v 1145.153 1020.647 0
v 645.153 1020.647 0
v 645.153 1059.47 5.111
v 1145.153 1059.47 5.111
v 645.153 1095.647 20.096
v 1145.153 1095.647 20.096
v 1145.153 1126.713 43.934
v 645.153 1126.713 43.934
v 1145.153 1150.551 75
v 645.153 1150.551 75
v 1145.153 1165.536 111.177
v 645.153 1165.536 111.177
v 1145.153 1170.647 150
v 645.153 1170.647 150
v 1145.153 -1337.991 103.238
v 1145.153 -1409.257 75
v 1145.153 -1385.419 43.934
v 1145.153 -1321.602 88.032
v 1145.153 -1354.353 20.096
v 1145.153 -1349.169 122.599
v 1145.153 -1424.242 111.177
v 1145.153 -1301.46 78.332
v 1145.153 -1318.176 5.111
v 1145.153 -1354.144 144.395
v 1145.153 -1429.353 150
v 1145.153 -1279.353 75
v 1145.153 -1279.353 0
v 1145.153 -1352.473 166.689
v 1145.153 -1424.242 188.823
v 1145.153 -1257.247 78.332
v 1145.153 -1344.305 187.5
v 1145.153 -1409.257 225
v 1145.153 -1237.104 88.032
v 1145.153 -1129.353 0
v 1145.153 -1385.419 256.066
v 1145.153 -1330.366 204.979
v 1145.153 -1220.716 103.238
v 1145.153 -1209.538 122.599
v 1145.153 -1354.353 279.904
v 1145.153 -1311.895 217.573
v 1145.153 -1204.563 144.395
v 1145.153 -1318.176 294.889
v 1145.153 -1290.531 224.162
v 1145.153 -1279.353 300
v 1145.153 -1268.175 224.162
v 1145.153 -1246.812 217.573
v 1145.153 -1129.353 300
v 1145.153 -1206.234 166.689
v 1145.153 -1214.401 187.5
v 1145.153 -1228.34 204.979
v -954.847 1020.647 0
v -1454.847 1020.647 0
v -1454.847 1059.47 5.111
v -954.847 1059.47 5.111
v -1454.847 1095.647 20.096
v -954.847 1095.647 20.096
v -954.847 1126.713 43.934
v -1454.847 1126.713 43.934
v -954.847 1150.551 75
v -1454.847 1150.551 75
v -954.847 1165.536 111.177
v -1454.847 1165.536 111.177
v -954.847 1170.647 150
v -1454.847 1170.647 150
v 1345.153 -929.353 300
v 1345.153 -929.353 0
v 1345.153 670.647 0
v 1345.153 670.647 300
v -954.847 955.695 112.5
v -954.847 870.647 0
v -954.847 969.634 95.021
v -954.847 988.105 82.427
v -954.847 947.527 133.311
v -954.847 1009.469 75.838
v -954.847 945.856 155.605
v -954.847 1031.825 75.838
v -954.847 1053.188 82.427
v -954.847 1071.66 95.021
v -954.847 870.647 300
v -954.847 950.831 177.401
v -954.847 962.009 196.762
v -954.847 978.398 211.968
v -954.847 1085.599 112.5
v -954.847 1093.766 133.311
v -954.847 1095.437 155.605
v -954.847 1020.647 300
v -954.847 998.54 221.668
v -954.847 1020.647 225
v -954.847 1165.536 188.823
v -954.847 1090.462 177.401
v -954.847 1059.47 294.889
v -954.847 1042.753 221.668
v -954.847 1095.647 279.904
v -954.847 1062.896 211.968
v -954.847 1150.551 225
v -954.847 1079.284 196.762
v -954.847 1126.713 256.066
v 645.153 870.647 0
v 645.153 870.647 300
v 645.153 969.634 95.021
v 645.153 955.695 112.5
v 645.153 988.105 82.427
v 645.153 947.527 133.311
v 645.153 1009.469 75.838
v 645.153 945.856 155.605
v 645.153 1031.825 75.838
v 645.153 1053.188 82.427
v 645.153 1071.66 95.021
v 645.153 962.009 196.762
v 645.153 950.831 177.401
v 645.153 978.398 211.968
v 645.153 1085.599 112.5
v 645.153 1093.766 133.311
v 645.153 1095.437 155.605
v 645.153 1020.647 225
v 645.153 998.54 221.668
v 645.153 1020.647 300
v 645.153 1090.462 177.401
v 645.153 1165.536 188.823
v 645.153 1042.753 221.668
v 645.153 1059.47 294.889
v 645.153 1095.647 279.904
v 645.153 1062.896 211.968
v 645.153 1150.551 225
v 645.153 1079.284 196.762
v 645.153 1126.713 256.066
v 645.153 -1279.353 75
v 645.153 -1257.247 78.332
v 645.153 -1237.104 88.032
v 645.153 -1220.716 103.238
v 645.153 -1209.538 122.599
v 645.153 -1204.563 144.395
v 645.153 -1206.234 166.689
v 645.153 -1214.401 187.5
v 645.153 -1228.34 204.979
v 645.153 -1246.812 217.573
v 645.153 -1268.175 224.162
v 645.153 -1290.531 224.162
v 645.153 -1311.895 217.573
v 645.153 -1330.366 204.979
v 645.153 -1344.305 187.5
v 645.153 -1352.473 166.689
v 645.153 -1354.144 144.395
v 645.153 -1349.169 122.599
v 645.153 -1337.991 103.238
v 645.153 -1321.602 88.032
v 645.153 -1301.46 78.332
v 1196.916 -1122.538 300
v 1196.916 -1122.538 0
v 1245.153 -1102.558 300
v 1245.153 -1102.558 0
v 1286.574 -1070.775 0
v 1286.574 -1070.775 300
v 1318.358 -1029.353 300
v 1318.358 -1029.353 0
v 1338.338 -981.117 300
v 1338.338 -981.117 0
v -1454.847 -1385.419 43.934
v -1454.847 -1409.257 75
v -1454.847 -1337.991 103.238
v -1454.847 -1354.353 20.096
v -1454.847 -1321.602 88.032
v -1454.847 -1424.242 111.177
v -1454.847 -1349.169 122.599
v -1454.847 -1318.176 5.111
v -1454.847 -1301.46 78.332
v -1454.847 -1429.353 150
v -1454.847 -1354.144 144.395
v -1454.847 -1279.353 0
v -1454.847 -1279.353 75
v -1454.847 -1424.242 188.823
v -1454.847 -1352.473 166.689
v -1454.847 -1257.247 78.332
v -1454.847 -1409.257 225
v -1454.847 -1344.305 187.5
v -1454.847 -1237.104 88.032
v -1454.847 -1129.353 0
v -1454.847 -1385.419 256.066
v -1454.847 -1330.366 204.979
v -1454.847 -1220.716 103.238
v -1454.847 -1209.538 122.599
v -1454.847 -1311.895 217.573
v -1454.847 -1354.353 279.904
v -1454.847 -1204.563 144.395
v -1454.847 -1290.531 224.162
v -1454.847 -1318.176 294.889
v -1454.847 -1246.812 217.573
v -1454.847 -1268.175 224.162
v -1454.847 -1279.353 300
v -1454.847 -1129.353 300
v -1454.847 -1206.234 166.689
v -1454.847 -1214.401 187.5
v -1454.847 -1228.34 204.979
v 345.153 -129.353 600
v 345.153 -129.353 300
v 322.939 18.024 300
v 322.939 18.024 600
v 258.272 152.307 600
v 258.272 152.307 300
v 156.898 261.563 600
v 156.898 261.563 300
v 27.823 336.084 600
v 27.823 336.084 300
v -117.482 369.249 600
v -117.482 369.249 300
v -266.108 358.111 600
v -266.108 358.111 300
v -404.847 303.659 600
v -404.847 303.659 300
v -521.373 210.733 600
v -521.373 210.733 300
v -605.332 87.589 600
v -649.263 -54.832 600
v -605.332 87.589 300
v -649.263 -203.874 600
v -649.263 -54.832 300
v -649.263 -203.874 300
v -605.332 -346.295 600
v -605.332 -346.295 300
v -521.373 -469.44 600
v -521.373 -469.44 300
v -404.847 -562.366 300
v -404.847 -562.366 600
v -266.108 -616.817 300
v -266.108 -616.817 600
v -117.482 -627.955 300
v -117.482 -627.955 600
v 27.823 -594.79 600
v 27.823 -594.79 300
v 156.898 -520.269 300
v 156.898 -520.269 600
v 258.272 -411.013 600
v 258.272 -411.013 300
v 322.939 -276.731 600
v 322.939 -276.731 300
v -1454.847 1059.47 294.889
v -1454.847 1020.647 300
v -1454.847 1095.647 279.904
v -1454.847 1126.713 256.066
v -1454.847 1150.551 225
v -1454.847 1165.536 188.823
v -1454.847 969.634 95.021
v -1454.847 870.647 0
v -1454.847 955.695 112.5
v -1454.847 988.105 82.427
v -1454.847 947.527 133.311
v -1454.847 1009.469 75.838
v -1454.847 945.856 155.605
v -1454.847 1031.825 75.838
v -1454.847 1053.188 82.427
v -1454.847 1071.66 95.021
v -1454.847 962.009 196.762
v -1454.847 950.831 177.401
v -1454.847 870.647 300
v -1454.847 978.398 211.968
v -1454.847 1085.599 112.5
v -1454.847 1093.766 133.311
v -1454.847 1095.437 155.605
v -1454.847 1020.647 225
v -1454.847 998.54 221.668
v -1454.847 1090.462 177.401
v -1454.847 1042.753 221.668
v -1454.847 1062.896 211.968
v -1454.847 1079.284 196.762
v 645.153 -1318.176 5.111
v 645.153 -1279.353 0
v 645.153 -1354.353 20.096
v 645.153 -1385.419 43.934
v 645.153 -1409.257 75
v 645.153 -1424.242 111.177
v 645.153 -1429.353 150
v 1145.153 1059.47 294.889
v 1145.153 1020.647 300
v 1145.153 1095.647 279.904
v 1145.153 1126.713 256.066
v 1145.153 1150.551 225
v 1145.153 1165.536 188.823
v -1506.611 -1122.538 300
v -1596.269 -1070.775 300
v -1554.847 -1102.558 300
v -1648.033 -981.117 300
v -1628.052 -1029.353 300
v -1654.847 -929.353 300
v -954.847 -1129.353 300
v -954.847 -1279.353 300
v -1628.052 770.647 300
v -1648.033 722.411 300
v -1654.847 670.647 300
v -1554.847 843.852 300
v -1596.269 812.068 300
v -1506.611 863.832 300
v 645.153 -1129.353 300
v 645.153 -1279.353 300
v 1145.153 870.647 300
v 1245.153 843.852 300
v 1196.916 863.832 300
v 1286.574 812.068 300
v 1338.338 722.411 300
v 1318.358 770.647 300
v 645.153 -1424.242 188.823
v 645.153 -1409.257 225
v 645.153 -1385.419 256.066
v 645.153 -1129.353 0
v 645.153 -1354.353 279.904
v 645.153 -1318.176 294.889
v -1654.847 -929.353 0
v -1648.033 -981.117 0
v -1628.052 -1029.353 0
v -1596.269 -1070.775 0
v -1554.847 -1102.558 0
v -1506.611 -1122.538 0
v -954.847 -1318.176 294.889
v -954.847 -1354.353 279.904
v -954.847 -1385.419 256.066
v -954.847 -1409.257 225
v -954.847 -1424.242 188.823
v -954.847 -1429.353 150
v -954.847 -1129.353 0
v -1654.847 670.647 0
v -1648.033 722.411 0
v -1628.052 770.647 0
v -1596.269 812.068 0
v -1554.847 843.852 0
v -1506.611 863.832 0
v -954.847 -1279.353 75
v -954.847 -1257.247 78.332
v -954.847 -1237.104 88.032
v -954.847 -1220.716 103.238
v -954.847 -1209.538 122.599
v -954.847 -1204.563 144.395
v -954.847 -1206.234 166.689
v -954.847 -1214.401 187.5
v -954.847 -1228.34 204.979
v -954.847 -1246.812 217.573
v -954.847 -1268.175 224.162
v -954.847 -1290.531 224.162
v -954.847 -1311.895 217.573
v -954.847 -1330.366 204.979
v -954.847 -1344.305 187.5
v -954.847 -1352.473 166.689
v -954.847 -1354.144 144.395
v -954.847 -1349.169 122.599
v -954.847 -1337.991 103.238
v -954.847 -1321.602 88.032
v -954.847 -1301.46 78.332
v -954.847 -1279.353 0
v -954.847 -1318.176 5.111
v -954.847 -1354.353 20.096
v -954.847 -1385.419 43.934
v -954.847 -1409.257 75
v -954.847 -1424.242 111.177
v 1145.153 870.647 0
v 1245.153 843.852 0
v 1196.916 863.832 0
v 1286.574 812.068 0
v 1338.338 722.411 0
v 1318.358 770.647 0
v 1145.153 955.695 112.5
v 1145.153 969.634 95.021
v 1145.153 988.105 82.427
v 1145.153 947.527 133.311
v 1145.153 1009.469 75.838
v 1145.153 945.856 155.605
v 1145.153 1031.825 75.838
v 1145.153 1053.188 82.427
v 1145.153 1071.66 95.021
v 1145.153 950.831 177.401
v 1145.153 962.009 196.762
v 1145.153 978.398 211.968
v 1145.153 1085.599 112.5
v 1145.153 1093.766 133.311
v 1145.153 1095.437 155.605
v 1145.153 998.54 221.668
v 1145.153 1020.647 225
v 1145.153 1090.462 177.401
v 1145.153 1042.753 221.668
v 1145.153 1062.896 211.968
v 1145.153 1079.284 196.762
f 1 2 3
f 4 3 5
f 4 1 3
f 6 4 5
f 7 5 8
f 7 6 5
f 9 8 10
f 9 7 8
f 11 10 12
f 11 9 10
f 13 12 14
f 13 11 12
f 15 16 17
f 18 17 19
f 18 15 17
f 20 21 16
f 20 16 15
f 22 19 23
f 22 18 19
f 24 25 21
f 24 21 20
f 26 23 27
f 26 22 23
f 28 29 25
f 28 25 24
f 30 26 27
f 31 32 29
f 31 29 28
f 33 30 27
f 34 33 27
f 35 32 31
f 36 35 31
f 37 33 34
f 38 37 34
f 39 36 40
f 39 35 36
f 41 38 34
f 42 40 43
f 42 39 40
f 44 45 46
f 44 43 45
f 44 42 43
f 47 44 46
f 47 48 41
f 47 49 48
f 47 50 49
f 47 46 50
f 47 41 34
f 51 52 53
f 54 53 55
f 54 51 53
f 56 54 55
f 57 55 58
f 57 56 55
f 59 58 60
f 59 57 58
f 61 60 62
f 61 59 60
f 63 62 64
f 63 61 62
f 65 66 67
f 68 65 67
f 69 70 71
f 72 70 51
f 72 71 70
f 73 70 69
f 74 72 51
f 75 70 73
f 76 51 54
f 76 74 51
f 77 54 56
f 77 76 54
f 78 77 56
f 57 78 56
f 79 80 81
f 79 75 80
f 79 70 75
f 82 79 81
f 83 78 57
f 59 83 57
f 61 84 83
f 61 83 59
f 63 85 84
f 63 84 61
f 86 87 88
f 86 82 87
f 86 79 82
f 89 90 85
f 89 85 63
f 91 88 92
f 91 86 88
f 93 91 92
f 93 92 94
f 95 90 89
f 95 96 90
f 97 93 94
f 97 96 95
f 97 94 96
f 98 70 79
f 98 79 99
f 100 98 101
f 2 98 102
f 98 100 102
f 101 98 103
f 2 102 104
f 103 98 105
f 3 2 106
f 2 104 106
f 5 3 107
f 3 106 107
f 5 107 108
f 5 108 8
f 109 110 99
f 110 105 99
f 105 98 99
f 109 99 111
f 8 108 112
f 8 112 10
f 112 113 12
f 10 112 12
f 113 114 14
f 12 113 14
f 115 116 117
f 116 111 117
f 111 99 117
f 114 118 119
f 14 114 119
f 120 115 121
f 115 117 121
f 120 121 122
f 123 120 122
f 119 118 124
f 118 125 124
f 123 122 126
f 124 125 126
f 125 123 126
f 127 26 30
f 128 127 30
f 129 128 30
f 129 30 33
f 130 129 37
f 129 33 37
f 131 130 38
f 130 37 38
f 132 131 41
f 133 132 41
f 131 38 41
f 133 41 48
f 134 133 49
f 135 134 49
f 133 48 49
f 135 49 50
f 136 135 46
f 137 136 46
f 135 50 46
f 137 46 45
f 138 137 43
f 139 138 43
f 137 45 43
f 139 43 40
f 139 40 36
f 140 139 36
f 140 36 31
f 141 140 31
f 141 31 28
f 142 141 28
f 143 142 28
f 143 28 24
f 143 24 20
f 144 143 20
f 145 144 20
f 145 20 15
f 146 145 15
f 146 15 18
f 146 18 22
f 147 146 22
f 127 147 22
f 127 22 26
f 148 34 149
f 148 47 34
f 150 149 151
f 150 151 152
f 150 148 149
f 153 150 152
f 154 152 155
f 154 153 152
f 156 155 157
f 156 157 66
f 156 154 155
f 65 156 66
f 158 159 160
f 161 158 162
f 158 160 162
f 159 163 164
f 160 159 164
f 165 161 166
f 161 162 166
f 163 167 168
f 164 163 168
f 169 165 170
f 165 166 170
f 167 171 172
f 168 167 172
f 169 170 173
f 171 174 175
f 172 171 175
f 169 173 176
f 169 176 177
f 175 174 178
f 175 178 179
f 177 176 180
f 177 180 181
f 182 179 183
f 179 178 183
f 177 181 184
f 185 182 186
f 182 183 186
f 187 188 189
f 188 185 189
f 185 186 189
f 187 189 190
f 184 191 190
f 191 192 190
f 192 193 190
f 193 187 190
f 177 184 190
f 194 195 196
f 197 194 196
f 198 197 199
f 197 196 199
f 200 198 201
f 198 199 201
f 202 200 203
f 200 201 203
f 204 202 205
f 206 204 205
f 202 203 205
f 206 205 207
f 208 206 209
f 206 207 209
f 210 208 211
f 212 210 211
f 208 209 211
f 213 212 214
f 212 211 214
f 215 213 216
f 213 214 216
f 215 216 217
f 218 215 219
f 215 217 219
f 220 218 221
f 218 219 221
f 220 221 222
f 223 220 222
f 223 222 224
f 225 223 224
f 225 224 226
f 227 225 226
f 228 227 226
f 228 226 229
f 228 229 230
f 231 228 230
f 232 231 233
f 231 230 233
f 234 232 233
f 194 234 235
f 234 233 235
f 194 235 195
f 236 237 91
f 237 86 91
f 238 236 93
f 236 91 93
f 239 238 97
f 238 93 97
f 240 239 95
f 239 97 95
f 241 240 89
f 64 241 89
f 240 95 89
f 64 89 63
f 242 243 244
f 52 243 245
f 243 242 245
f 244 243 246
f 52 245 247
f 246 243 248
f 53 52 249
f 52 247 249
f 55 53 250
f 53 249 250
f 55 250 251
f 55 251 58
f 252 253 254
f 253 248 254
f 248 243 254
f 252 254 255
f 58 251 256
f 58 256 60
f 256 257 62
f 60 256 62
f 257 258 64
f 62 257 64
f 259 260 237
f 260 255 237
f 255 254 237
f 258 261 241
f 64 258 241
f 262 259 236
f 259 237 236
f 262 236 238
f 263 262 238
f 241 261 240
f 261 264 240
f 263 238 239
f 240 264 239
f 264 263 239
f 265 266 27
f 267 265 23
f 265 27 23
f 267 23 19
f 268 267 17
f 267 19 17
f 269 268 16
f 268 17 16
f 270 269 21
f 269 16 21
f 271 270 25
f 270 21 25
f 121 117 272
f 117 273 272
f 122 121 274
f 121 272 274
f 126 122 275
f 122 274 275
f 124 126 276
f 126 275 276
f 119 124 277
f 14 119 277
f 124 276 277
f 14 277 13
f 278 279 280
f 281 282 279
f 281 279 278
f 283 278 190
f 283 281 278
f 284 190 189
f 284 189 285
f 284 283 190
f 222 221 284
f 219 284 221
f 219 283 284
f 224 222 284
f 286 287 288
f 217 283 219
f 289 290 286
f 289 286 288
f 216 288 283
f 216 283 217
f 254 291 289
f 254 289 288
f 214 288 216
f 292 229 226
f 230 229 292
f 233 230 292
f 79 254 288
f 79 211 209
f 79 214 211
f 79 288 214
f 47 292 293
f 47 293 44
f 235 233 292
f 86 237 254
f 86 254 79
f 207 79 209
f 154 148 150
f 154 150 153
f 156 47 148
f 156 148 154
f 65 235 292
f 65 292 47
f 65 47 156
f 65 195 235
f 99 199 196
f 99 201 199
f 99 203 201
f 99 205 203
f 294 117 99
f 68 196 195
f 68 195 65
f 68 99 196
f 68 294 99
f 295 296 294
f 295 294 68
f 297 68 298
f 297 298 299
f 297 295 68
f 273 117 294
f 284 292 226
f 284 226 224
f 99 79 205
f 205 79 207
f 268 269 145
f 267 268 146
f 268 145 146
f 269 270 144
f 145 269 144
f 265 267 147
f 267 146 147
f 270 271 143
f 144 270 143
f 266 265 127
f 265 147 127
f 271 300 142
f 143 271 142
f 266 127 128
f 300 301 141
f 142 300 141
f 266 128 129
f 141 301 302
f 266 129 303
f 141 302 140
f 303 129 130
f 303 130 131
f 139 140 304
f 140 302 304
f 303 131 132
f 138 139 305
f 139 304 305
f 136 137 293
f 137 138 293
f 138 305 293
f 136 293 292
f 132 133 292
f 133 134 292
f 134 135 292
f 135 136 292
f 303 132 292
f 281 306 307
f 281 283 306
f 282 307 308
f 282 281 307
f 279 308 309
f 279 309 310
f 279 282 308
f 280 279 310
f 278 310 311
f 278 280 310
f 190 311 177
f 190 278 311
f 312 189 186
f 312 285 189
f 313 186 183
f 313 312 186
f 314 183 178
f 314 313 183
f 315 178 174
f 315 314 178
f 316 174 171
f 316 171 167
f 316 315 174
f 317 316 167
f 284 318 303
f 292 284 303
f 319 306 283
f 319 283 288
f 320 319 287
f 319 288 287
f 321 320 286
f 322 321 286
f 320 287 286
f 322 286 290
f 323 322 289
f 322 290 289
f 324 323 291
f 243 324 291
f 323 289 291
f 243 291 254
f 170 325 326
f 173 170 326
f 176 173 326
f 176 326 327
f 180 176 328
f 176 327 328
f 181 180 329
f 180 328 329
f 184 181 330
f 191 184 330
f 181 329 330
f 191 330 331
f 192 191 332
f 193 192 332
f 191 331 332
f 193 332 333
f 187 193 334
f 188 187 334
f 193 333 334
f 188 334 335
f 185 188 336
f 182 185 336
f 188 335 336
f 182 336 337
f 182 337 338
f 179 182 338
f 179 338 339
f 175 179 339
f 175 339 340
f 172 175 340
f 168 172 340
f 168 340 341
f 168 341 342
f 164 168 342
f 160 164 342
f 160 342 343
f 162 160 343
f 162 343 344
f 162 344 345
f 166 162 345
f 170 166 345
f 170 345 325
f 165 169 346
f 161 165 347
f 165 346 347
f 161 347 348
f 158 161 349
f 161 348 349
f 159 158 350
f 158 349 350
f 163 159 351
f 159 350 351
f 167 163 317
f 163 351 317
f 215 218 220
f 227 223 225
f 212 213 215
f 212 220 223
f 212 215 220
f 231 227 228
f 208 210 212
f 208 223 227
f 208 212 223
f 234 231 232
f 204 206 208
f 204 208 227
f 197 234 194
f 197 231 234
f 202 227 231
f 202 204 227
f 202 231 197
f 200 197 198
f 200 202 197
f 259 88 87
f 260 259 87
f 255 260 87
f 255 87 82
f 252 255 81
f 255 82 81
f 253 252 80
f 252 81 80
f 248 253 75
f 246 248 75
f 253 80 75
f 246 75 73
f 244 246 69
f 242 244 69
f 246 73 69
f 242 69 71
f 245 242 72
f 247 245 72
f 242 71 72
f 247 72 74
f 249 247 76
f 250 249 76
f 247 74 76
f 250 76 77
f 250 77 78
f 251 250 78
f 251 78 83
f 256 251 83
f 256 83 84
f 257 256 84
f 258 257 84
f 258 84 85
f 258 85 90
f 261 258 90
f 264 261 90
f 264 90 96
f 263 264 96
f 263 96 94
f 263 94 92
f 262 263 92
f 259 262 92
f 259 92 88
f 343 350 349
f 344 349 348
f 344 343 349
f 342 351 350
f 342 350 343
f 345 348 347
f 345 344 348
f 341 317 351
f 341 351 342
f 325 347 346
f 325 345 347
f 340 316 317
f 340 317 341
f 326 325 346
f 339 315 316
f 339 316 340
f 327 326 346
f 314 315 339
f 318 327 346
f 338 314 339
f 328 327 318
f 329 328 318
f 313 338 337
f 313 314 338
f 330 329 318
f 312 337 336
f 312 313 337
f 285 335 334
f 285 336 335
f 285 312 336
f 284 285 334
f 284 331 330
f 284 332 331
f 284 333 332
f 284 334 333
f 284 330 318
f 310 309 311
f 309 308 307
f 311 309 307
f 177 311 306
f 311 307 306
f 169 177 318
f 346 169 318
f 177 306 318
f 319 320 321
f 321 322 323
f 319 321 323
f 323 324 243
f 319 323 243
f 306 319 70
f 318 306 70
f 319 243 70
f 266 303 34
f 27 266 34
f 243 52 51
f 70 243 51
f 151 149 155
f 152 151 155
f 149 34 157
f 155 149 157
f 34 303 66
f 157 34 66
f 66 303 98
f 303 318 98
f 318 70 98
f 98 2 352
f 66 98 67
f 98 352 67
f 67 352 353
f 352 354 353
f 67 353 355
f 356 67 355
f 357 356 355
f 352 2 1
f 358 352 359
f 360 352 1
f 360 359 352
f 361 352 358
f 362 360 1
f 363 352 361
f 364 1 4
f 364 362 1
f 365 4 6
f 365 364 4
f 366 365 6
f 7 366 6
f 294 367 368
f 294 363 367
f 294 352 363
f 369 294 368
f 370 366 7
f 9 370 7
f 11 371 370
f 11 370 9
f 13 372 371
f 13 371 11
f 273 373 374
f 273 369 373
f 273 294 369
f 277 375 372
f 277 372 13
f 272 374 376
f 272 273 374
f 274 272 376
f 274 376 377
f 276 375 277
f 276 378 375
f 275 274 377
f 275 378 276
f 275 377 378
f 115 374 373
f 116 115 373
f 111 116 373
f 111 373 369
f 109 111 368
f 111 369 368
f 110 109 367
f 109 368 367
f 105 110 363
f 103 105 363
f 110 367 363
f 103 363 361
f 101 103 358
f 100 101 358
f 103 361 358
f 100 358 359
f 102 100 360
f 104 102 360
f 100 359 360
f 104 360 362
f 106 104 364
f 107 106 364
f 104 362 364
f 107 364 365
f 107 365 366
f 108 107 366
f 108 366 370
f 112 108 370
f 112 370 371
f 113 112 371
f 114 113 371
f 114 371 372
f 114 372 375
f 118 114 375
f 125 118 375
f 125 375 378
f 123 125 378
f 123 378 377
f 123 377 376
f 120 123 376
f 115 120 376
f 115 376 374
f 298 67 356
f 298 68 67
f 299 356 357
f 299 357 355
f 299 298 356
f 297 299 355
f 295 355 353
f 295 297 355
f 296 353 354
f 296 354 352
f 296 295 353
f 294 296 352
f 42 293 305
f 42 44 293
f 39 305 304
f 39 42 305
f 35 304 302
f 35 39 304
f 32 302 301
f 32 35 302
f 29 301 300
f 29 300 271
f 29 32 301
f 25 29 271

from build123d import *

# Parameters (mm, degrees)
IZIM1_W                     = 3000
IZIM1_H                     = 2000
Y_KSEKLIK_EKSTR_ZYON1_DEPTH = 300
RADYUS1_R                   = 200
IZIM2_W                     = 500
IZIM2_H                     = 300
Y_KSEKLIK_EKSTR_ZYON2_DEPTH = 300
IZIM3_R                     = 75
KES_EKSTR_ZYON1_DEPTH       = 3686
RADYUS2_R                   = 150
IZIM4_R                     = 500
Y_KSEKLIK_EKSTR_ZYON3_DEPTH = 300


with BuildPart() as part:
    # Çizim1 → Yükseklik-Ekstrüzyon1 (new body)
    with BuildSketch(Plane.XY):
        with Locations((-154.847360295, -129.353233831)):
            Rectangle(IZIM1_W, IZIM1_H)
    extrude(amount=Y_KSEKLIK_EKSTR_ZYON1_DEPTH)

    # Radyus1
    radyus1_edges = [part.edges().sort_by_distance(p)[0] for p in [
        (-1654.847360295, 870.646766169, 150),
        (1345.152639705, 870.646766169, 150),
        (1345.152639705, -1129.353233831, 150),
        (-1654.847360295, -1129.353233831, 150),
    ]]
    fillet(radyus1_edges, radius=RADYUS1_R)

    # Çizim2 → Yükseklik-Ekstrüzyon2 (add)
    with BuildSketch(Plane.XY.offset(300)):
        with Locations((-1204.847360295, 1020.646766169)):
            Rectangle(IZIM2_W, IZIM2_H)
        with Locations((895.152639705, 1020.646766169)):
            Rectangle(IZIM2_W, IZIM2_H)
        with Locations((895.152639705, -1279.353233831)):
            Rectangle(IZIM2_W, IZIM2_H)
        with Locations((-1204.847360295, -1279.353233831)):
            Rectangle(IZIM2_W, IZIM2_H)
    extrude(amount=-Y_KSEKLIK_EKSTR_ZYON2_DEPTH)

    # Çizim3 → Kes-Ekstrüzyon1 (cut)
    with BuildSketch(Plane(origin=(1345.152639705, 0, 0), x_dir=(0, 0, -1), z_dir=(1, 0, 0))):
        with Locations(Location((-150, 1020.646766169, 0), (0, 0, 180))):
            Circle(IZIM3_R)
        with Locations((-150, -1279.353233831)):
            Circle(IZIM3_R)
    extrude(amount=-KES_EKSTR_ZYON1_DEPTH, mode=Mode.SUBTRACT)

    # Radyus2
    radyus2_edges = [part.edges().sort_by_distance(p)[0] for p in [
        (-1204.847360295, -1429.353233831, 300),
        (-1204.847360295, -1429.353233831, 0),
        (895.152639705, -1429.353233831, 300),
        (895.152639705, -1429.353233831, 0),
        (895.152639705, 1170.646766169, 300),
        (895.152639705, 1170.646766169, 0),
        (-1204.847360295, 1170.646766169, 300),
        (-1204.847360295, 1170.646766169, 0),
    ]]
    fillet(radyus2_edges, radius=RADYUS2_R - 0.0001)  # a hair under: the kernel refuses the full size

    # Çizim4 → Yükseklik-Ekstrüzyon3 (add)
    with BuildSketch(Plane.XY.offset(300)):
        with Locations((-154.847360295, -129.353233831)):
            Circle(IZIM4_R)
    extrude(amount=Y_KSEKLIK_EKSTR_ZYON3_DEPTH)


solid = part.part
